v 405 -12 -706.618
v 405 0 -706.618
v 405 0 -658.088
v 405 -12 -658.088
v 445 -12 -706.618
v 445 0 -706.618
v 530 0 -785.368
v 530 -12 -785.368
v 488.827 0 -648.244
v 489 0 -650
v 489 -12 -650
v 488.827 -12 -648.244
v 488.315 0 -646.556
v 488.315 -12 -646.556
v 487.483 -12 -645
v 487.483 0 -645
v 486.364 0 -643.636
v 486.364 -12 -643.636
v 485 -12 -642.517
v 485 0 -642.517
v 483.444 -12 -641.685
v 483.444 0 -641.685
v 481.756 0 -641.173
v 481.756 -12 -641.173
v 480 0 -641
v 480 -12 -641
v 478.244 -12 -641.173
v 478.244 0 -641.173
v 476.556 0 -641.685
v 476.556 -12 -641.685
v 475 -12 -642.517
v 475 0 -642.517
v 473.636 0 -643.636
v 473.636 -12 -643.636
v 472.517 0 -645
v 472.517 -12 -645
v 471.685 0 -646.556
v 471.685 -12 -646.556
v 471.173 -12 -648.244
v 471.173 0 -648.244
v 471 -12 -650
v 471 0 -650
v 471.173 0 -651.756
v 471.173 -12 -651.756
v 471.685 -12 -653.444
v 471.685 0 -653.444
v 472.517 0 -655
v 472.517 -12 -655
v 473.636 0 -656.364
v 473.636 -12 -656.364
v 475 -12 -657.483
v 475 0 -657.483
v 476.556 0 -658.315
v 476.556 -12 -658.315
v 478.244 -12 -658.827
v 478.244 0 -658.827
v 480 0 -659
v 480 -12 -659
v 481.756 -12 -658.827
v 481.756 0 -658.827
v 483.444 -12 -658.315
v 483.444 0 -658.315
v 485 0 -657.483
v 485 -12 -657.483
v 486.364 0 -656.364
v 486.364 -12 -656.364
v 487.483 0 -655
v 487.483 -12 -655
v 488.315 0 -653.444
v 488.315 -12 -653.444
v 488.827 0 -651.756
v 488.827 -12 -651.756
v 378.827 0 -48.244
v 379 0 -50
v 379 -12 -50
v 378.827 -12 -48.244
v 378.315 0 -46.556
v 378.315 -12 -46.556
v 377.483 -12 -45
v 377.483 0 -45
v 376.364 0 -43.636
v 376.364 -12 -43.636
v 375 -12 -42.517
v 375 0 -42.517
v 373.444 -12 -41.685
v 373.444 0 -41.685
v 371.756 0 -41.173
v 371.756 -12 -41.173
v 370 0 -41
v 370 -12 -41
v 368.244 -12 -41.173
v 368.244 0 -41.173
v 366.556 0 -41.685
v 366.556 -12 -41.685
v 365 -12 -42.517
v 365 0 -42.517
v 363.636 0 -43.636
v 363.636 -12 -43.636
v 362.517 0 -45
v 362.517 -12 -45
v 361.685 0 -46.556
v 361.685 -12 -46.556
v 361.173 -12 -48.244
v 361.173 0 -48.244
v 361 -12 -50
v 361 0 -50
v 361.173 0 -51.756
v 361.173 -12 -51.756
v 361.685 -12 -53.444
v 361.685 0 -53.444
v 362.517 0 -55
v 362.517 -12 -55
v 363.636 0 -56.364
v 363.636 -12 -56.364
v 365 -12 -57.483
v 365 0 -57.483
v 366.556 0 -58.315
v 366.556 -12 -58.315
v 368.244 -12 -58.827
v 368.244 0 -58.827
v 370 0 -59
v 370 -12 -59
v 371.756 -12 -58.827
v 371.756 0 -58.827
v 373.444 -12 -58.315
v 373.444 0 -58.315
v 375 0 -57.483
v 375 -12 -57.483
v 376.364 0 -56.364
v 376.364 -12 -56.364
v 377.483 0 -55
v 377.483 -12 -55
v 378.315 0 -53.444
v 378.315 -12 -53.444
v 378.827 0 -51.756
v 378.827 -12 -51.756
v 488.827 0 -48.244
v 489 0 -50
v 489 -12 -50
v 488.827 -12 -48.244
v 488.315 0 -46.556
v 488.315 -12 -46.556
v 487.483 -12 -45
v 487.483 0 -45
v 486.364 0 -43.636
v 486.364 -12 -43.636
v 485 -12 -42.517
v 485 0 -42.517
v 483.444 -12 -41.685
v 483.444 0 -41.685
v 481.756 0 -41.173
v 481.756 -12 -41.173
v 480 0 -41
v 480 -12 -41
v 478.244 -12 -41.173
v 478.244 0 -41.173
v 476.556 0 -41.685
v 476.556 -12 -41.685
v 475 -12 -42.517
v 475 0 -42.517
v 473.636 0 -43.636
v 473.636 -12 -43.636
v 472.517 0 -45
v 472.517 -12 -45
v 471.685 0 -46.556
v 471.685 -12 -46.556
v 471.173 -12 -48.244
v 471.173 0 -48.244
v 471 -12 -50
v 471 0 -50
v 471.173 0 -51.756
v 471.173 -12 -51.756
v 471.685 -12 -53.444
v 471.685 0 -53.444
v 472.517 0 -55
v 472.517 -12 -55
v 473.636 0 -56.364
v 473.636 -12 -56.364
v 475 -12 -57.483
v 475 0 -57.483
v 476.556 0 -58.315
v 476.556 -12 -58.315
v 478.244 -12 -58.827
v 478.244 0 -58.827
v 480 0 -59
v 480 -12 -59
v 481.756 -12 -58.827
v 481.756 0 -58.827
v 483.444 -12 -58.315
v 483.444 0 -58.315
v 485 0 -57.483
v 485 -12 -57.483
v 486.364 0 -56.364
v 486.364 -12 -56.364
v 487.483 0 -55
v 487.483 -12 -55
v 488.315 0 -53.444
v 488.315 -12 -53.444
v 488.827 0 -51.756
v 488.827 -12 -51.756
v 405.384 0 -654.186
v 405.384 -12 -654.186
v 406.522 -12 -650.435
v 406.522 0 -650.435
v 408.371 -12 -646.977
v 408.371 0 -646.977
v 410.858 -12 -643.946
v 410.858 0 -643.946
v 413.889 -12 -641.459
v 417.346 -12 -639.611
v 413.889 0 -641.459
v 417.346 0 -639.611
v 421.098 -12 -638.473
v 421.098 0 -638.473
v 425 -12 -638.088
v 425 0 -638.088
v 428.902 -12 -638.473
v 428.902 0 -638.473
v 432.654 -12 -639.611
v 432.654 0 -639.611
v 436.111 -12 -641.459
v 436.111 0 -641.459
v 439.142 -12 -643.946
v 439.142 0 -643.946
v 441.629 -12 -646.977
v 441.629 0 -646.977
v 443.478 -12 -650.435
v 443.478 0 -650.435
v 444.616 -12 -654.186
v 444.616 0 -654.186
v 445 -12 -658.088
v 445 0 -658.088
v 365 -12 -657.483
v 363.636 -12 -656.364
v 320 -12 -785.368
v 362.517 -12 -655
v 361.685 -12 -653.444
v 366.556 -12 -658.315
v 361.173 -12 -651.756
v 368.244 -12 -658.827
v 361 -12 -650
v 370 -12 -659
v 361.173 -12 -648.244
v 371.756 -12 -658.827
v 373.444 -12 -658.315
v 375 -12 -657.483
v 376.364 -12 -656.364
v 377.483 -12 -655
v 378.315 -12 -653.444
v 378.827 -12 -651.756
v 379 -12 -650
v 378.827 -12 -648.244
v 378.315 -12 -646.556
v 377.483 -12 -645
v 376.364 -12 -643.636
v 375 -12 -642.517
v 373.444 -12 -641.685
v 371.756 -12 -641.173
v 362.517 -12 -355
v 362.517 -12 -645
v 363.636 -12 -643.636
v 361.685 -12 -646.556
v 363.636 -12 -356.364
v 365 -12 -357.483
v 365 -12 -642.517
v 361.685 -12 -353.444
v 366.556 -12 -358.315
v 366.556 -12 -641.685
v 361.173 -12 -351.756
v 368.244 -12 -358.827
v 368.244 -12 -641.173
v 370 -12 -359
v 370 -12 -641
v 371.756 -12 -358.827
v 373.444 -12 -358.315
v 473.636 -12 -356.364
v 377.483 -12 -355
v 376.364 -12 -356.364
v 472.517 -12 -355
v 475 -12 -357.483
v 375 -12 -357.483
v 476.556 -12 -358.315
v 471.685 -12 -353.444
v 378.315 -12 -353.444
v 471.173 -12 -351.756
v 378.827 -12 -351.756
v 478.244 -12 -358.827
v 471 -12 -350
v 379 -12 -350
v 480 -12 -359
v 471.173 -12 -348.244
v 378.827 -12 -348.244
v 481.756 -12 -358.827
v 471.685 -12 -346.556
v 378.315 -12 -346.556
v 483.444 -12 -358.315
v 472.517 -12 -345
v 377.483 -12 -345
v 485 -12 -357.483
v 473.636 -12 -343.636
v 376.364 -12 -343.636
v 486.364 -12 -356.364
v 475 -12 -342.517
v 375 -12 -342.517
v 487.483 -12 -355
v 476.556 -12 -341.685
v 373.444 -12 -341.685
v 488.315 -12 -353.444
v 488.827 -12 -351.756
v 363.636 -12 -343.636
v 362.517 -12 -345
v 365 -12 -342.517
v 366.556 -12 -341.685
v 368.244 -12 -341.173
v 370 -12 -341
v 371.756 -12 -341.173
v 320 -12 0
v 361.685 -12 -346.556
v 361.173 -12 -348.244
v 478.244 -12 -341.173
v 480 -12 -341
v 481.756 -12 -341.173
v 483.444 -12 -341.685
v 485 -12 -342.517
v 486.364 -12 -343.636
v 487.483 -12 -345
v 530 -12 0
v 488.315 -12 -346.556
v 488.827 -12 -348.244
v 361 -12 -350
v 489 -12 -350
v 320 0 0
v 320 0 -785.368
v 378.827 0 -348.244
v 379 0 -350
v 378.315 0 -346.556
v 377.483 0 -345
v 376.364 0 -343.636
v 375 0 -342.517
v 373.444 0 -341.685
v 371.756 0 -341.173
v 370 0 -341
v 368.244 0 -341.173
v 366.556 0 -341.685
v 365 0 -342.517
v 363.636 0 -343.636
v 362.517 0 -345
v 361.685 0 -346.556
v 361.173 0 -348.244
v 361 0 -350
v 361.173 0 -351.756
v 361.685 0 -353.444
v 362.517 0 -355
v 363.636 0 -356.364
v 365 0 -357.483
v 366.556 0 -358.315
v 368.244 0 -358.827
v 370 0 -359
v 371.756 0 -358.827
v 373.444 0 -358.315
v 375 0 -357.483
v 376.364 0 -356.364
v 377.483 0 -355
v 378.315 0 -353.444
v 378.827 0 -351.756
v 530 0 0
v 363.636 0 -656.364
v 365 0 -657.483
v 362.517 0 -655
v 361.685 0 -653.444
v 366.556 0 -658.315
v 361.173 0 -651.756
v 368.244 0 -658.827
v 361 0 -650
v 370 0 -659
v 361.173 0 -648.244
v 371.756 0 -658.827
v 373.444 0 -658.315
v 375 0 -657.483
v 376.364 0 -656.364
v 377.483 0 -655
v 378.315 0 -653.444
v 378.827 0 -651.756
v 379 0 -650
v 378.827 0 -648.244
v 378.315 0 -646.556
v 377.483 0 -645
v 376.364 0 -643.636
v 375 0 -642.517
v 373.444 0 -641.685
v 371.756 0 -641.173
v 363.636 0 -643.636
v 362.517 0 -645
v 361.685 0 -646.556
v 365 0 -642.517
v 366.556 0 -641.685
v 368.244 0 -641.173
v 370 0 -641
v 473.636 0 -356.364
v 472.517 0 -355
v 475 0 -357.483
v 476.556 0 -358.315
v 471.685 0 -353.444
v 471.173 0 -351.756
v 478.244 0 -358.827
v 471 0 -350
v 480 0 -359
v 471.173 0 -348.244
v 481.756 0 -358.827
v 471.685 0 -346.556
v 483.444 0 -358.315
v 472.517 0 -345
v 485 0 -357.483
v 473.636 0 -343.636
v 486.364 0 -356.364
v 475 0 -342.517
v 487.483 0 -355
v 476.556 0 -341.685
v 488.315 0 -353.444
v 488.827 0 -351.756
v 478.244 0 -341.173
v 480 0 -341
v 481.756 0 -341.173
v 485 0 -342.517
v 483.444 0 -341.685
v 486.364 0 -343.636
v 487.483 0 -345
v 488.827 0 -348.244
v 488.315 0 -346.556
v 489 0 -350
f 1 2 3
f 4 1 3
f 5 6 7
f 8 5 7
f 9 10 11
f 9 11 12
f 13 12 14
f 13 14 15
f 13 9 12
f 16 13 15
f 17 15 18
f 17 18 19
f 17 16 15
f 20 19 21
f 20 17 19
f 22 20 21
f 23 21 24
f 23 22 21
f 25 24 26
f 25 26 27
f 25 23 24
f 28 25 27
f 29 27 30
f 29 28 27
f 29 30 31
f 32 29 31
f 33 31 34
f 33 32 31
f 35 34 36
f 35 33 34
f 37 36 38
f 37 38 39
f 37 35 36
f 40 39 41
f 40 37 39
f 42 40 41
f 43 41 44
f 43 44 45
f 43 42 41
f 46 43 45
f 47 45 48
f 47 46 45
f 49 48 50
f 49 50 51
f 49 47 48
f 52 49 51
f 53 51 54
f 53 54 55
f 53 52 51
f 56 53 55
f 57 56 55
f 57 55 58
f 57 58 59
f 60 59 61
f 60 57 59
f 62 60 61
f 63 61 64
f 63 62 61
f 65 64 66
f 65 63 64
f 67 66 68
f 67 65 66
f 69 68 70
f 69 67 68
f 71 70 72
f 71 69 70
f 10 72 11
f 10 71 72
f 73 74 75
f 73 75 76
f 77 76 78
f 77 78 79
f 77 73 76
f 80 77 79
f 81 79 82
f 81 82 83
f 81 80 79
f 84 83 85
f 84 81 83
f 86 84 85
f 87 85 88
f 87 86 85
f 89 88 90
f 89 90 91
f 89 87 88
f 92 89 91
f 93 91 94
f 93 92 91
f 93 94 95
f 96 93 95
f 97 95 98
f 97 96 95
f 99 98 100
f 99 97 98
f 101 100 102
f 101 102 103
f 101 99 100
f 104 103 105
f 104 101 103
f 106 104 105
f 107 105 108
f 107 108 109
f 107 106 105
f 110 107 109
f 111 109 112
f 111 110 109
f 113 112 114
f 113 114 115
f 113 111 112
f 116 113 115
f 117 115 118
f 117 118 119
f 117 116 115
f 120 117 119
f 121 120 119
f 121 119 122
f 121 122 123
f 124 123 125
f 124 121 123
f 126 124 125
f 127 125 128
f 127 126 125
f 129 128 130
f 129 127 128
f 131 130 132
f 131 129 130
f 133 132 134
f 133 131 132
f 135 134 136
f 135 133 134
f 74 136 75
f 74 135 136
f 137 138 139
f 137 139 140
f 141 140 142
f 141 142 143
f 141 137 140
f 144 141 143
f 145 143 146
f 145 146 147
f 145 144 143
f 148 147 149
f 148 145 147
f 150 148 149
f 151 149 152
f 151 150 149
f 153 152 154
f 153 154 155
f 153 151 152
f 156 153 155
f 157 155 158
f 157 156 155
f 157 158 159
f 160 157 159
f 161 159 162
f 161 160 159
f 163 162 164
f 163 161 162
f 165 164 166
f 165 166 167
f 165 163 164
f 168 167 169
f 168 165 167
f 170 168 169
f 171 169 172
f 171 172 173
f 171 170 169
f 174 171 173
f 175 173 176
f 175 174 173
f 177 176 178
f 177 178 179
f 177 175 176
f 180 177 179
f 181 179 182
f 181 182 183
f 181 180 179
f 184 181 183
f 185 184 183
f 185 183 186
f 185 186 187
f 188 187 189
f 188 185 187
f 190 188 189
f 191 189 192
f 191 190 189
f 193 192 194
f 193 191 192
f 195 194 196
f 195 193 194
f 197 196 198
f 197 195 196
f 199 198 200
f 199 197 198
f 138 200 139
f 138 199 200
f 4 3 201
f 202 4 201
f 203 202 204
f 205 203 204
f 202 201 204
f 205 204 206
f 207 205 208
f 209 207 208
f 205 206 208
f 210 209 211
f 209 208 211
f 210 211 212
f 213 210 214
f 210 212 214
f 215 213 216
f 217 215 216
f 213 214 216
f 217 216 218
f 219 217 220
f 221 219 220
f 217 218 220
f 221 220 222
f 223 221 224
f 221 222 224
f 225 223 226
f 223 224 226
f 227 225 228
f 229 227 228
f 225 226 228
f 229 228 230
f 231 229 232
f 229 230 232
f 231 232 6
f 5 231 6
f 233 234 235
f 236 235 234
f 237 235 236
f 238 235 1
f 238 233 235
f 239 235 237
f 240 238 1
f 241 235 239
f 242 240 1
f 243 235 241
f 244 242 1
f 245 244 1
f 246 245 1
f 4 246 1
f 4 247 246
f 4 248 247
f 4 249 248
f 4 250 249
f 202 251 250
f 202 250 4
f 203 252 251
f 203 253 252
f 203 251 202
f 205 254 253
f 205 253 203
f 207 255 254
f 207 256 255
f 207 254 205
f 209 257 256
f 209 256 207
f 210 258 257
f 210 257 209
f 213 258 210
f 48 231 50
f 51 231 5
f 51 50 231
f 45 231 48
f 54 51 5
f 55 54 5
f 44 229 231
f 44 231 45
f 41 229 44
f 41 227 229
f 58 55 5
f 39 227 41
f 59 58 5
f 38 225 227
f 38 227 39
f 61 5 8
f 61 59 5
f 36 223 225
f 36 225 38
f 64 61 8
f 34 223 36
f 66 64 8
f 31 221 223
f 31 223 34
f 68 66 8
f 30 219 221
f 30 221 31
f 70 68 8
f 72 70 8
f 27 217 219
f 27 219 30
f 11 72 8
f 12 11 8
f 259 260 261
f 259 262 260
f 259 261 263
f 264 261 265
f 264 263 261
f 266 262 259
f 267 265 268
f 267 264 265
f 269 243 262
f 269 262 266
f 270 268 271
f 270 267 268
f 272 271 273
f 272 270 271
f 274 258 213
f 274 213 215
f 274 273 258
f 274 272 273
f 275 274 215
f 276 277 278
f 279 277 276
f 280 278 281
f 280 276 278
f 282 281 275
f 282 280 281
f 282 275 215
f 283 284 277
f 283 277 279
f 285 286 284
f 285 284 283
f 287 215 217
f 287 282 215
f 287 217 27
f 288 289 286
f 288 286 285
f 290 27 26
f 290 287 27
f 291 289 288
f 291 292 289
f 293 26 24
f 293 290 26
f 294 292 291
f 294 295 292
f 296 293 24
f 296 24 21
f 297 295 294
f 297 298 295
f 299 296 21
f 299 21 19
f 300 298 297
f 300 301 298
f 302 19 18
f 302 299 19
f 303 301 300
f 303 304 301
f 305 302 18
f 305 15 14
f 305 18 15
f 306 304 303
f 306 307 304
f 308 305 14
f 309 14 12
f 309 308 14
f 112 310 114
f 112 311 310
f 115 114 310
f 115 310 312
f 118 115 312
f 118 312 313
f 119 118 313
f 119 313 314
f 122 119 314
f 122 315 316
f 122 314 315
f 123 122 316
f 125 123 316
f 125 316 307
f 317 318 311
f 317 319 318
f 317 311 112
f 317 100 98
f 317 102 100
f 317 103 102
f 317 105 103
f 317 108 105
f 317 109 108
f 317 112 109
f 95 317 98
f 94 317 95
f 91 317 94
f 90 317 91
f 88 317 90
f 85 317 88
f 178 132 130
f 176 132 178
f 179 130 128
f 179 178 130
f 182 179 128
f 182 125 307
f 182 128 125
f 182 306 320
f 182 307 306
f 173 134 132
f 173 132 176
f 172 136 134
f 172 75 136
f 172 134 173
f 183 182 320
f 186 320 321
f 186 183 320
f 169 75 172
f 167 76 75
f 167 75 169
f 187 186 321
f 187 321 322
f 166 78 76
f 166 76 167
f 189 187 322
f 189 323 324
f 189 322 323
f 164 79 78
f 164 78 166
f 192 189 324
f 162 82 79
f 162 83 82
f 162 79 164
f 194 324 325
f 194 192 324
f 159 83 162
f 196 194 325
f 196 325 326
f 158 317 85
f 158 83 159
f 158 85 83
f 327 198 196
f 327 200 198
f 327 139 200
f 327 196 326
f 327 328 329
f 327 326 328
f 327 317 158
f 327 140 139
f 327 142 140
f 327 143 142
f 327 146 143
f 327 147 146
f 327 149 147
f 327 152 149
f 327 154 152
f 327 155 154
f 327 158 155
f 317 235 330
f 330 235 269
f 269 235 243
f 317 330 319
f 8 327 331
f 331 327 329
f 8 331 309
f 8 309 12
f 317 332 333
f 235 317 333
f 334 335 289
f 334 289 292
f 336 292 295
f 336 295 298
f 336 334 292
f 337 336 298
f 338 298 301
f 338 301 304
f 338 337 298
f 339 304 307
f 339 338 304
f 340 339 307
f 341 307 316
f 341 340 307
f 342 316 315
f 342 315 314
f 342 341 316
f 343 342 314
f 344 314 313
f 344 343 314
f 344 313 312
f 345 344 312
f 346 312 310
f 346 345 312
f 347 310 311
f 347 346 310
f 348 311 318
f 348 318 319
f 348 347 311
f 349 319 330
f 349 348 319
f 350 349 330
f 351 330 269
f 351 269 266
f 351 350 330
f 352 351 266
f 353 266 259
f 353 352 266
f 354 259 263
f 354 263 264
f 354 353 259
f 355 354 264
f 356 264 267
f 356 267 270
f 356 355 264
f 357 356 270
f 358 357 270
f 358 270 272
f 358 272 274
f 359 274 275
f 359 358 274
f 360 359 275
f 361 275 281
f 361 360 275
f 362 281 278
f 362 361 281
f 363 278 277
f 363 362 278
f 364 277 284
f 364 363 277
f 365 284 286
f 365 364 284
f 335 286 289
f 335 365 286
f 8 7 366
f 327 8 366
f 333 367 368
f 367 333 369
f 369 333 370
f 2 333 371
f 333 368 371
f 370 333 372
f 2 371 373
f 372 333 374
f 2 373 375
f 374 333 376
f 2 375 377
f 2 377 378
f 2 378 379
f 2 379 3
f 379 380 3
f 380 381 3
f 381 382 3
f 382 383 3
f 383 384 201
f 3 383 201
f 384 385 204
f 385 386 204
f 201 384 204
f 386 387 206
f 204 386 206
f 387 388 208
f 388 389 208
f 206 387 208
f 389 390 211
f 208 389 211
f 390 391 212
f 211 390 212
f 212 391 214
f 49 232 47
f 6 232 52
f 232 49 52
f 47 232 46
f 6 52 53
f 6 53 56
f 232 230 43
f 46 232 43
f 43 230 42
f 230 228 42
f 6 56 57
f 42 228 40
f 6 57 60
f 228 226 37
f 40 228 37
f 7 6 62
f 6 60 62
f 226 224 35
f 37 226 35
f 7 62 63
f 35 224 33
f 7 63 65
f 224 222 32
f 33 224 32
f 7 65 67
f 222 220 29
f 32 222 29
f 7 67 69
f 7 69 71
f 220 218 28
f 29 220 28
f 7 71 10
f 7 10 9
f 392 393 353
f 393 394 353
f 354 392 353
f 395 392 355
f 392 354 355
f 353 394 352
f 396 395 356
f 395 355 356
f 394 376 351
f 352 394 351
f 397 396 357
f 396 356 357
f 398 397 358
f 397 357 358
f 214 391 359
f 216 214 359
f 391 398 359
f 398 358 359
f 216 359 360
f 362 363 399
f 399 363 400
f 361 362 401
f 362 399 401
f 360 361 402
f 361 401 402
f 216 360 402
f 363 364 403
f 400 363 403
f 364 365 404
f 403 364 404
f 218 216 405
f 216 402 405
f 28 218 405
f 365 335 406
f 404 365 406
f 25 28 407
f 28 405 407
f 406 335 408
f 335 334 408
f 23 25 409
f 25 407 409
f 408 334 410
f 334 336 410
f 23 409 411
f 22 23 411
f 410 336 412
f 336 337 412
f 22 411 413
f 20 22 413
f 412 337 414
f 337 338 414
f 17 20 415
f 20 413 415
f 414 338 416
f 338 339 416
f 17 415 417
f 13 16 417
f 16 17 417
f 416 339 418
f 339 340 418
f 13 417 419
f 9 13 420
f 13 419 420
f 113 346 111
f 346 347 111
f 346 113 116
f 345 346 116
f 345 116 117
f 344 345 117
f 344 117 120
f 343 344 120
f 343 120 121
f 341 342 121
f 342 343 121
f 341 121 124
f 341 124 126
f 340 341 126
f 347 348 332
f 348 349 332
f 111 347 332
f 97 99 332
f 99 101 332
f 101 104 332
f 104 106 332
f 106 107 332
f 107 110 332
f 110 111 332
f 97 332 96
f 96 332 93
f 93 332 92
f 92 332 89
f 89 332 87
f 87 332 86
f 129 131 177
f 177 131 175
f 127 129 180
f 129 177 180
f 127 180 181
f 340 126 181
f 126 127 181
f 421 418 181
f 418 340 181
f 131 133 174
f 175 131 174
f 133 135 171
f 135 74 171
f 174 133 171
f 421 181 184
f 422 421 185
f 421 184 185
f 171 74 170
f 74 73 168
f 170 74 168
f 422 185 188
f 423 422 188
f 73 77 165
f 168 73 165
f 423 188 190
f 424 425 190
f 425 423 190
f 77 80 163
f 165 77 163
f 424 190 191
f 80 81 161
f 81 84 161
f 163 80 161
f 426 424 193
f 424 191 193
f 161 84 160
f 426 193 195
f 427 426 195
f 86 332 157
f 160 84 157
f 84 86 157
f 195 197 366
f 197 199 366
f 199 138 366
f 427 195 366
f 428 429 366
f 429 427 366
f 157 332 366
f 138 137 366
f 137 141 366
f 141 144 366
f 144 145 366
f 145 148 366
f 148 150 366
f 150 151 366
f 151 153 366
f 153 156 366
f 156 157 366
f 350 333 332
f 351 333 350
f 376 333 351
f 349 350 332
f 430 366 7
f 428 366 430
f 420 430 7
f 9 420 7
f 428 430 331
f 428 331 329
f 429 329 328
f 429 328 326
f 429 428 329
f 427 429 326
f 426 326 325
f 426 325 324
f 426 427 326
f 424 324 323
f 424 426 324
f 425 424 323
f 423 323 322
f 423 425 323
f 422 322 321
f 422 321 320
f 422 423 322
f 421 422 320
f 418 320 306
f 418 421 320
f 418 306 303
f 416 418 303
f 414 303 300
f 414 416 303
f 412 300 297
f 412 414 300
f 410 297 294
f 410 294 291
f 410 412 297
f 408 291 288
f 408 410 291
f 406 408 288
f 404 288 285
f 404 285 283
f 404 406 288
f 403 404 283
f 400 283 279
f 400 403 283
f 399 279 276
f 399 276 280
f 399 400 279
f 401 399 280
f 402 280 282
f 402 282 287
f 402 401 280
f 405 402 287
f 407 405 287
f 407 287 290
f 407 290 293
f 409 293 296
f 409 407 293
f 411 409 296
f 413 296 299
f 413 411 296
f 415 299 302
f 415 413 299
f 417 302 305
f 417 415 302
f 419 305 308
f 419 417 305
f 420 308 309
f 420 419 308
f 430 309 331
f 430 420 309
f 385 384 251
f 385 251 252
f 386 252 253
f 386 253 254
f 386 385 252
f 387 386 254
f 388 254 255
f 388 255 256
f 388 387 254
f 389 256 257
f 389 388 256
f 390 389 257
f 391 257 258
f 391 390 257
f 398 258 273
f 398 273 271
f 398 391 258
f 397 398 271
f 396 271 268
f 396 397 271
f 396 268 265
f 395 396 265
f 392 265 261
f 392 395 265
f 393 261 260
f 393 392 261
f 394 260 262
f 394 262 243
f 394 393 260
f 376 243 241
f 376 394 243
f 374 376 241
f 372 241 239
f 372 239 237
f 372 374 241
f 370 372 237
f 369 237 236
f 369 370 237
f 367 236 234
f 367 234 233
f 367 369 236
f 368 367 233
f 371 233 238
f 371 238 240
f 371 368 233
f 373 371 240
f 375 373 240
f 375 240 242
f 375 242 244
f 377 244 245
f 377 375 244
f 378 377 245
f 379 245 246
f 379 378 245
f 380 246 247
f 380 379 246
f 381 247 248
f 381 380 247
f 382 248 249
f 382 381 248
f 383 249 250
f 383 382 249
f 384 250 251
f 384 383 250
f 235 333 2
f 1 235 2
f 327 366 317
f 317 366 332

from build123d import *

# Parameters (mm, degrees)
F0_R     = 9
F1_DEPTH = 12


with BuildPart() as f1:
    # F0 (on Front) → F1 (new body)
    with BuildSketch(Plane.XZ):
        with BuildLine():
            Line((530, 0), (320, 0))
            Line((320, 0), (320, -785.367647))
            Line((320, -785.367647), (405, -706.617647))
            Line((405, -706.617647), (405, -658.088235))
            ThreePointArc((405, -658.088235), (425, -638.088235), (445, -658.088235))
            Line((445, -658.088235), (445, -706.617647))
            Line((445, -706.617647), (530, -785.367647))
            Line((530, -785.367647), (530, 0))
        make_face()
        with Locations((370, -650)):
            Circle(F0_R, mode=Mode.SUBTRACT)
        with Locations((480, -650)):
            Circle(F0_R, mode=Mode.SUBTRACT)
        with Locations((370, -350)):
            Circle(F0_R, mode=Mode.SUBTRACT)
        with Locations((370, -50)):
            Circle(F0_R, mode=Mode.SUBTRACT)
        with Locations((480, -350)):
            Circle(F0_R, mode=Mode.SUBTRACT)
        with Locations((480, -50)):
            Circle(F0_R, mode=Mode.SUBTRACT)
    extrude(amount=F1_DEPTH)


solid = f1.part
